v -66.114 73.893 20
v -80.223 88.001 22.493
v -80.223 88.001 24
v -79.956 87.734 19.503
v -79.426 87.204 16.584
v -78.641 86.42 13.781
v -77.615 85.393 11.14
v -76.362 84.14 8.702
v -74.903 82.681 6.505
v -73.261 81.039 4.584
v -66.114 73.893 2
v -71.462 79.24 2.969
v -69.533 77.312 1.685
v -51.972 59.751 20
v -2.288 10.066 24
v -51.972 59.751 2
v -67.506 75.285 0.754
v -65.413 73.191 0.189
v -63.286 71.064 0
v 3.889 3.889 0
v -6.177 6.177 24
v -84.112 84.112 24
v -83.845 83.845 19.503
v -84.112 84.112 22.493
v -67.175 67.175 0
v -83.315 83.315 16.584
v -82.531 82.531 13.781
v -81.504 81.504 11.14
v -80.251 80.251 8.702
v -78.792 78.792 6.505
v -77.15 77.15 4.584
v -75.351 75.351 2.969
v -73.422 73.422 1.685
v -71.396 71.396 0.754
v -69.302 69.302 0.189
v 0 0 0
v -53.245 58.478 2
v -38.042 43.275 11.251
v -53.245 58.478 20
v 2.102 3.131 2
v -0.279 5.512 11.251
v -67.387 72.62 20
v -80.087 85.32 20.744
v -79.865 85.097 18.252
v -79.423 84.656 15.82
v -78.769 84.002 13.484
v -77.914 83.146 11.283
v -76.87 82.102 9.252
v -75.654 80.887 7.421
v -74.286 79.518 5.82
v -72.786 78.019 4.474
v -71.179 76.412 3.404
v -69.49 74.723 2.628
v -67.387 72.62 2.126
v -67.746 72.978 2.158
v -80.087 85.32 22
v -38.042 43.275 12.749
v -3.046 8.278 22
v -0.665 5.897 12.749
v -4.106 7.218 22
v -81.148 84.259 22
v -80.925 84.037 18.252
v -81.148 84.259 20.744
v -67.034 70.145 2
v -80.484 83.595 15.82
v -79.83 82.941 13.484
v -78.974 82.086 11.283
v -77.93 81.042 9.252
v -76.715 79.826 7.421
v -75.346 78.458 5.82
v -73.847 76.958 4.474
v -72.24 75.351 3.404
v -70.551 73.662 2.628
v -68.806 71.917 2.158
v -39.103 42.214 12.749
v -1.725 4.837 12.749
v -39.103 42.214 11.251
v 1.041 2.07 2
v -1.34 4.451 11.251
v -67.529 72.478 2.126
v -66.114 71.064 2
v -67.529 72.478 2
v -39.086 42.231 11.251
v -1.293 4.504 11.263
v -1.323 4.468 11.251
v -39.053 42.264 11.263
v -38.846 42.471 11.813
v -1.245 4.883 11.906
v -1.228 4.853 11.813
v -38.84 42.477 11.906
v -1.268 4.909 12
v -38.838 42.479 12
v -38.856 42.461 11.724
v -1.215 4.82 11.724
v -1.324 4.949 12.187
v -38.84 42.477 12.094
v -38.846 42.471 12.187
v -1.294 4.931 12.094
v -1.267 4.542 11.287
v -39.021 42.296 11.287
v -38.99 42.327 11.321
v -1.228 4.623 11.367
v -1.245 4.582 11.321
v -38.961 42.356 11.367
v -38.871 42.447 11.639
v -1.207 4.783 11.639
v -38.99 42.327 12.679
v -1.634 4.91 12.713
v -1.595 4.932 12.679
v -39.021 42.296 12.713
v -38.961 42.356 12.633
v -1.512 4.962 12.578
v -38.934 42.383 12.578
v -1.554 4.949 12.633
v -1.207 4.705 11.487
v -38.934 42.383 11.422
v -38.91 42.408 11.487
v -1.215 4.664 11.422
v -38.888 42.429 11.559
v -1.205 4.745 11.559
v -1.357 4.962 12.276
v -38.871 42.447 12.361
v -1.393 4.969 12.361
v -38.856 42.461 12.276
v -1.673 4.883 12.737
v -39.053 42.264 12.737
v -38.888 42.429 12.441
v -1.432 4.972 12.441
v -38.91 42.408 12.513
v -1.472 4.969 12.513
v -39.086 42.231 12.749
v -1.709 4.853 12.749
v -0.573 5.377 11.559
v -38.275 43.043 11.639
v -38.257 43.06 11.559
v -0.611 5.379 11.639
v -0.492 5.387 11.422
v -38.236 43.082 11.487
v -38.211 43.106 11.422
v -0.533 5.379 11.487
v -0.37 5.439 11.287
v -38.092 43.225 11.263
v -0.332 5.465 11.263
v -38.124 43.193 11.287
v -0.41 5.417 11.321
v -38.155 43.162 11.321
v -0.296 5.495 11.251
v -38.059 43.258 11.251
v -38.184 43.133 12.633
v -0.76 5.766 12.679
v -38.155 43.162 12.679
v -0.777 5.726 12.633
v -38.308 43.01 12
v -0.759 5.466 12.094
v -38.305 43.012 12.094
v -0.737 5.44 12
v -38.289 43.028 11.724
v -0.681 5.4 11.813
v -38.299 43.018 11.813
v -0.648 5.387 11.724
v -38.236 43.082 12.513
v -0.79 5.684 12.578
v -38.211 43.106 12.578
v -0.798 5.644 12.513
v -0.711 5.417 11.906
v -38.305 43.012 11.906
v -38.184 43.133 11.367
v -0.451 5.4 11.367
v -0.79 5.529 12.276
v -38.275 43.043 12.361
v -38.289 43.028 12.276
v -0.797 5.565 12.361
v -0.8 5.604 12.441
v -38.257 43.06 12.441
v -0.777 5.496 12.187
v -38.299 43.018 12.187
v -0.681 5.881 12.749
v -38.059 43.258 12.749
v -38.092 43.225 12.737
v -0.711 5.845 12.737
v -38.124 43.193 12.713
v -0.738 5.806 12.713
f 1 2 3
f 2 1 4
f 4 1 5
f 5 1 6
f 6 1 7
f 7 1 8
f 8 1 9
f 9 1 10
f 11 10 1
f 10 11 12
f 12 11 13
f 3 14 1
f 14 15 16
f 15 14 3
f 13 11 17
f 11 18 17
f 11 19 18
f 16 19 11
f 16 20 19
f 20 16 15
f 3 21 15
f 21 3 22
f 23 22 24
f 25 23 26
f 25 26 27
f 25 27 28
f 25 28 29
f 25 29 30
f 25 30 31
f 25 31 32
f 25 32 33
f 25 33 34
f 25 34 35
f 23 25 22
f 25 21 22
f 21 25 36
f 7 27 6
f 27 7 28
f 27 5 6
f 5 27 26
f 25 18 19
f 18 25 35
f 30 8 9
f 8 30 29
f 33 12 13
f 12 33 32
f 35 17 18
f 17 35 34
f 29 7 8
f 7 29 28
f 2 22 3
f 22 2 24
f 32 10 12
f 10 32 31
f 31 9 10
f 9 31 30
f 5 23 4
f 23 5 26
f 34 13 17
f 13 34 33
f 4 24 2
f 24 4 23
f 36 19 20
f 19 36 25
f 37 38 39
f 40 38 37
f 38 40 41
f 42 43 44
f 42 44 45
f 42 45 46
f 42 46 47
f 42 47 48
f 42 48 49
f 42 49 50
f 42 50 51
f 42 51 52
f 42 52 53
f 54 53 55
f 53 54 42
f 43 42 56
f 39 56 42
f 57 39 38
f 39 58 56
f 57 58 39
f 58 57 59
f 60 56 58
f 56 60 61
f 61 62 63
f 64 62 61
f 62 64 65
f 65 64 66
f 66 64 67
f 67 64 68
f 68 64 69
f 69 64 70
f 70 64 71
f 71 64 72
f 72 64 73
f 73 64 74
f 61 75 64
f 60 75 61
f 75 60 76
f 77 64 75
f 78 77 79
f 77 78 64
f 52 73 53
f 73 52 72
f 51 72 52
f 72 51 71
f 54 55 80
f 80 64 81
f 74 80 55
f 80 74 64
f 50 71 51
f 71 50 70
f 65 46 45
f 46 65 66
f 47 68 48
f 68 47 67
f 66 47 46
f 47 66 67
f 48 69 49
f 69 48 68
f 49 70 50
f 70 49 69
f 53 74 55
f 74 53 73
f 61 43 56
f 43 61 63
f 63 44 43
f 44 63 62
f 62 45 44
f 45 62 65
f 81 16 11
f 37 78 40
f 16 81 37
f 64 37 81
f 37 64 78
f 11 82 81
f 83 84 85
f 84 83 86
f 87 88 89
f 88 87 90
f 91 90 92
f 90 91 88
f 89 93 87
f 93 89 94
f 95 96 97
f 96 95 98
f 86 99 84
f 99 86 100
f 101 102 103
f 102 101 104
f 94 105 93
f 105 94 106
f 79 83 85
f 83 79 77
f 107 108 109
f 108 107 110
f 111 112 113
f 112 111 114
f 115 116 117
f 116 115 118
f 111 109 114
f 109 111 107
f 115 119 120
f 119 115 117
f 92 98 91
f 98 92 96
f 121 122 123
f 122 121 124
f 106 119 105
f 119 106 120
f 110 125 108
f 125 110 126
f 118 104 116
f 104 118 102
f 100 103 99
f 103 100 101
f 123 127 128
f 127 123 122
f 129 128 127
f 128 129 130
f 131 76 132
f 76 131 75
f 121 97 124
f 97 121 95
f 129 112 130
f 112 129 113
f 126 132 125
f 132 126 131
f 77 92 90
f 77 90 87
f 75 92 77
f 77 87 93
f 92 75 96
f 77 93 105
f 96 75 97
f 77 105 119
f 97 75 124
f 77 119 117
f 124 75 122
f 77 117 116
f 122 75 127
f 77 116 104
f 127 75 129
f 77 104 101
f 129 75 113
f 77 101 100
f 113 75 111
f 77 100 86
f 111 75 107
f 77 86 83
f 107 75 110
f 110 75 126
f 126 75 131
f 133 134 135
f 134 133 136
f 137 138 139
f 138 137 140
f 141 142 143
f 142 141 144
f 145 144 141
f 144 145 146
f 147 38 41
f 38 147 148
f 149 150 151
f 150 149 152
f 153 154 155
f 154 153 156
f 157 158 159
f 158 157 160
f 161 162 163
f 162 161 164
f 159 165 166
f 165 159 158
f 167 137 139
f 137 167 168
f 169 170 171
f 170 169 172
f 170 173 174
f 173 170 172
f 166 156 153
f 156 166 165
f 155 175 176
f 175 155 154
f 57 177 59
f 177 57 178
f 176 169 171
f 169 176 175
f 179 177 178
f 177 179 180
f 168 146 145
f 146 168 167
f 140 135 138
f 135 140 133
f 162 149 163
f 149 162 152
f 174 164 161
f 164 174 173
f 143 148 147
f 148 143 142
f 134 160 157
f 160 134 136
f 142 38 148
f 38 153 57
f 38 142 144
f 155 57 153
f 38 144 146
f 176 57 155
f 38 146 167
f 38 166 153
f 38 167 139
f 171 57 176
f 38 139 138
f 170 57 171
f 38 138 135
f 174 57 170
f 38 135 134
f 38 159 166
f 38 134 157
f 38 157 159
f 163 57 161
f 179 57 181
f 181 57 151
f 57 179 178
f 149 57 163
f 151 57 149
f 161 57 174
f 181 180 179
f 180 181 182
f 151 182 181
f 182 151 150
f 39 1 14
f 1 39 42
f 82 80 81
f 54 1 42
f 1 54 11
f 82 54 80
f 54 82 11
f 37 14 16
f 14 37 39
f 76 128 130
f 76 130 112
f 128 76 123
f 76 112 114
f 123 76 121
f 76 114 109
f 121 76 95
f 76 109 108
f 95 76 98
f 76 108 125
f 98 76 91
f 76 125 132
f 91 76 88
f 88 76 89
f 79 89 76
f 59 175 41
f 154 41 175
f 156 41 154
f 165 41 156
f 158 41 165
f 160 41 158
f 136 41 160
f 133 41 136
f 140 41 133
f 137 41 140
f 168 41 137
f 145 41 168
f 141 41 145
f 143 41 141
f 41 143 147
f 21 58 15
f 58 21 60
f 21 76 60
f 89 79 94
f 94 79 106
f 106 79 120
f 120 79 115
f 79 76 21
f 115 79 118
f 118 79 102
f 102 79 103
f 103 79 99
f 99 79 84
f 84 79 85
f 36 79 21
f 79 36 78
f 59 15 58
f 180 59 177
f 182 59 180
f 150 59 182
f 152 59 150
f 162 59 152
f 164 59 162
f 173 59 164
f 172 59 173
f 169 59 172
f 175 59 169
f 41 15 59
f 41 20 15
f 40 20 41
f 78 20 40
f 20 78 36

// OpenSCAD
// parametric knife sheath
// original by Steve Pendergrast (vorpal)
// https://www.thingiverse.com/thing:125109
//
// remix by BikeCyclist: Introducing holding ridge and oblique cut-off at grip
// https://www.thingiverse.com/thing:2856699

// length: the length of the blade from handle to tip
// maxwidth: the maximum width of the blade
// tipwidth:  the width near the tip, zero means it comes to a point
// thickness: maximum thickness of the blade
// show:  0 = do not put a window to show the blade style
// has_ridges: 0 = do not add ridges to the sheath to hold the knife by friction
// grip_cutoff_angle:  the angle of the mouth of the sheet at the grip (off the vertical)
//
// all measurements are in mm

//CUSTOMIZER VARIABLES

//	Knife length, mm
knife_length = 115;	//	[25:350]

//	Knife Max Blade width, mm
knife_width = 18;	//	[10:100]

//	Knife thickness, mm
knife_thickness = 1.5;	//	[1:5]

// Show knife through window?
knife_show = 1; // [0:No, 1:Yes]

// Sheath has ridges to hold the knife more securely?
has_ridges = 1; // [0:No, 1:Yes]

// Angle of the sheath at the grip (0 = vertical) [0:75]
grip_cutoff_angle = 20;

//CUSTOMIZER VARIABLES END

$fn = 50*1;  // while debugging reduce this to 20 to save time

wall = 2*1;
pad = 2*1;

rotate([0,0,45])
	parasheath(length=knife_length, maxwidth=knife_width, thickness=knife_thickness, show=knife_show);


module parasheath(length=200, maxwidth=25, thickness=2, show=1) {

    difference() {

        union () {

            difference() {

                // first make an oversized blade, oversized by 2 times the wall thickness

                blade(len=length+wall+pad,maxwid=maxwidth+pad+2*wall,thick=thickness+2*wall);

                translate([wall+0.2,-0.1,wall]) 
                    blade(len=length+0.1+pad, maxwid=maxwidth+pad, thick=thickness);

            }
            
            if (has_ridges)
            for (i = [-1, 1])
                translate([wall + 0.2 + knife_thickness/2, 0, wall + knife_width/2 + pad/2]) 
                    translate ([i * knife_thickness/2, 0, 0])
                        rotate ([-90, 0, 0])
                            scale ([1, 2, 1])
                                cylinder (d = knife_thickness / 2, h = length/2);
            
        }
        
        if (show)
            translate([thickness+wall,length-2*maxwidth,wall]) 
                    cube([100,wall+maxwidth,maxwidth]);

        rotate ([-grip_cutoff_angle, 0, 0])
            translate([0, -100, 0]) 
                    cube([200,200,200], center=true);
    }
}

module blade(len=200, maxwid=25, tipwid=5, thick=2) {

	union() {
		intersection() {
				// first make a cube
				cube([thick, len, maxwid]);
	
				translate([0,len-maxwid,maxwid]) 
					rotate([0,90,0]) 
						cylinder(r=maxwid,h=thick*3,center=true);
		}

		cube([thick,len-maxwid,maxwid]);
	}
}
